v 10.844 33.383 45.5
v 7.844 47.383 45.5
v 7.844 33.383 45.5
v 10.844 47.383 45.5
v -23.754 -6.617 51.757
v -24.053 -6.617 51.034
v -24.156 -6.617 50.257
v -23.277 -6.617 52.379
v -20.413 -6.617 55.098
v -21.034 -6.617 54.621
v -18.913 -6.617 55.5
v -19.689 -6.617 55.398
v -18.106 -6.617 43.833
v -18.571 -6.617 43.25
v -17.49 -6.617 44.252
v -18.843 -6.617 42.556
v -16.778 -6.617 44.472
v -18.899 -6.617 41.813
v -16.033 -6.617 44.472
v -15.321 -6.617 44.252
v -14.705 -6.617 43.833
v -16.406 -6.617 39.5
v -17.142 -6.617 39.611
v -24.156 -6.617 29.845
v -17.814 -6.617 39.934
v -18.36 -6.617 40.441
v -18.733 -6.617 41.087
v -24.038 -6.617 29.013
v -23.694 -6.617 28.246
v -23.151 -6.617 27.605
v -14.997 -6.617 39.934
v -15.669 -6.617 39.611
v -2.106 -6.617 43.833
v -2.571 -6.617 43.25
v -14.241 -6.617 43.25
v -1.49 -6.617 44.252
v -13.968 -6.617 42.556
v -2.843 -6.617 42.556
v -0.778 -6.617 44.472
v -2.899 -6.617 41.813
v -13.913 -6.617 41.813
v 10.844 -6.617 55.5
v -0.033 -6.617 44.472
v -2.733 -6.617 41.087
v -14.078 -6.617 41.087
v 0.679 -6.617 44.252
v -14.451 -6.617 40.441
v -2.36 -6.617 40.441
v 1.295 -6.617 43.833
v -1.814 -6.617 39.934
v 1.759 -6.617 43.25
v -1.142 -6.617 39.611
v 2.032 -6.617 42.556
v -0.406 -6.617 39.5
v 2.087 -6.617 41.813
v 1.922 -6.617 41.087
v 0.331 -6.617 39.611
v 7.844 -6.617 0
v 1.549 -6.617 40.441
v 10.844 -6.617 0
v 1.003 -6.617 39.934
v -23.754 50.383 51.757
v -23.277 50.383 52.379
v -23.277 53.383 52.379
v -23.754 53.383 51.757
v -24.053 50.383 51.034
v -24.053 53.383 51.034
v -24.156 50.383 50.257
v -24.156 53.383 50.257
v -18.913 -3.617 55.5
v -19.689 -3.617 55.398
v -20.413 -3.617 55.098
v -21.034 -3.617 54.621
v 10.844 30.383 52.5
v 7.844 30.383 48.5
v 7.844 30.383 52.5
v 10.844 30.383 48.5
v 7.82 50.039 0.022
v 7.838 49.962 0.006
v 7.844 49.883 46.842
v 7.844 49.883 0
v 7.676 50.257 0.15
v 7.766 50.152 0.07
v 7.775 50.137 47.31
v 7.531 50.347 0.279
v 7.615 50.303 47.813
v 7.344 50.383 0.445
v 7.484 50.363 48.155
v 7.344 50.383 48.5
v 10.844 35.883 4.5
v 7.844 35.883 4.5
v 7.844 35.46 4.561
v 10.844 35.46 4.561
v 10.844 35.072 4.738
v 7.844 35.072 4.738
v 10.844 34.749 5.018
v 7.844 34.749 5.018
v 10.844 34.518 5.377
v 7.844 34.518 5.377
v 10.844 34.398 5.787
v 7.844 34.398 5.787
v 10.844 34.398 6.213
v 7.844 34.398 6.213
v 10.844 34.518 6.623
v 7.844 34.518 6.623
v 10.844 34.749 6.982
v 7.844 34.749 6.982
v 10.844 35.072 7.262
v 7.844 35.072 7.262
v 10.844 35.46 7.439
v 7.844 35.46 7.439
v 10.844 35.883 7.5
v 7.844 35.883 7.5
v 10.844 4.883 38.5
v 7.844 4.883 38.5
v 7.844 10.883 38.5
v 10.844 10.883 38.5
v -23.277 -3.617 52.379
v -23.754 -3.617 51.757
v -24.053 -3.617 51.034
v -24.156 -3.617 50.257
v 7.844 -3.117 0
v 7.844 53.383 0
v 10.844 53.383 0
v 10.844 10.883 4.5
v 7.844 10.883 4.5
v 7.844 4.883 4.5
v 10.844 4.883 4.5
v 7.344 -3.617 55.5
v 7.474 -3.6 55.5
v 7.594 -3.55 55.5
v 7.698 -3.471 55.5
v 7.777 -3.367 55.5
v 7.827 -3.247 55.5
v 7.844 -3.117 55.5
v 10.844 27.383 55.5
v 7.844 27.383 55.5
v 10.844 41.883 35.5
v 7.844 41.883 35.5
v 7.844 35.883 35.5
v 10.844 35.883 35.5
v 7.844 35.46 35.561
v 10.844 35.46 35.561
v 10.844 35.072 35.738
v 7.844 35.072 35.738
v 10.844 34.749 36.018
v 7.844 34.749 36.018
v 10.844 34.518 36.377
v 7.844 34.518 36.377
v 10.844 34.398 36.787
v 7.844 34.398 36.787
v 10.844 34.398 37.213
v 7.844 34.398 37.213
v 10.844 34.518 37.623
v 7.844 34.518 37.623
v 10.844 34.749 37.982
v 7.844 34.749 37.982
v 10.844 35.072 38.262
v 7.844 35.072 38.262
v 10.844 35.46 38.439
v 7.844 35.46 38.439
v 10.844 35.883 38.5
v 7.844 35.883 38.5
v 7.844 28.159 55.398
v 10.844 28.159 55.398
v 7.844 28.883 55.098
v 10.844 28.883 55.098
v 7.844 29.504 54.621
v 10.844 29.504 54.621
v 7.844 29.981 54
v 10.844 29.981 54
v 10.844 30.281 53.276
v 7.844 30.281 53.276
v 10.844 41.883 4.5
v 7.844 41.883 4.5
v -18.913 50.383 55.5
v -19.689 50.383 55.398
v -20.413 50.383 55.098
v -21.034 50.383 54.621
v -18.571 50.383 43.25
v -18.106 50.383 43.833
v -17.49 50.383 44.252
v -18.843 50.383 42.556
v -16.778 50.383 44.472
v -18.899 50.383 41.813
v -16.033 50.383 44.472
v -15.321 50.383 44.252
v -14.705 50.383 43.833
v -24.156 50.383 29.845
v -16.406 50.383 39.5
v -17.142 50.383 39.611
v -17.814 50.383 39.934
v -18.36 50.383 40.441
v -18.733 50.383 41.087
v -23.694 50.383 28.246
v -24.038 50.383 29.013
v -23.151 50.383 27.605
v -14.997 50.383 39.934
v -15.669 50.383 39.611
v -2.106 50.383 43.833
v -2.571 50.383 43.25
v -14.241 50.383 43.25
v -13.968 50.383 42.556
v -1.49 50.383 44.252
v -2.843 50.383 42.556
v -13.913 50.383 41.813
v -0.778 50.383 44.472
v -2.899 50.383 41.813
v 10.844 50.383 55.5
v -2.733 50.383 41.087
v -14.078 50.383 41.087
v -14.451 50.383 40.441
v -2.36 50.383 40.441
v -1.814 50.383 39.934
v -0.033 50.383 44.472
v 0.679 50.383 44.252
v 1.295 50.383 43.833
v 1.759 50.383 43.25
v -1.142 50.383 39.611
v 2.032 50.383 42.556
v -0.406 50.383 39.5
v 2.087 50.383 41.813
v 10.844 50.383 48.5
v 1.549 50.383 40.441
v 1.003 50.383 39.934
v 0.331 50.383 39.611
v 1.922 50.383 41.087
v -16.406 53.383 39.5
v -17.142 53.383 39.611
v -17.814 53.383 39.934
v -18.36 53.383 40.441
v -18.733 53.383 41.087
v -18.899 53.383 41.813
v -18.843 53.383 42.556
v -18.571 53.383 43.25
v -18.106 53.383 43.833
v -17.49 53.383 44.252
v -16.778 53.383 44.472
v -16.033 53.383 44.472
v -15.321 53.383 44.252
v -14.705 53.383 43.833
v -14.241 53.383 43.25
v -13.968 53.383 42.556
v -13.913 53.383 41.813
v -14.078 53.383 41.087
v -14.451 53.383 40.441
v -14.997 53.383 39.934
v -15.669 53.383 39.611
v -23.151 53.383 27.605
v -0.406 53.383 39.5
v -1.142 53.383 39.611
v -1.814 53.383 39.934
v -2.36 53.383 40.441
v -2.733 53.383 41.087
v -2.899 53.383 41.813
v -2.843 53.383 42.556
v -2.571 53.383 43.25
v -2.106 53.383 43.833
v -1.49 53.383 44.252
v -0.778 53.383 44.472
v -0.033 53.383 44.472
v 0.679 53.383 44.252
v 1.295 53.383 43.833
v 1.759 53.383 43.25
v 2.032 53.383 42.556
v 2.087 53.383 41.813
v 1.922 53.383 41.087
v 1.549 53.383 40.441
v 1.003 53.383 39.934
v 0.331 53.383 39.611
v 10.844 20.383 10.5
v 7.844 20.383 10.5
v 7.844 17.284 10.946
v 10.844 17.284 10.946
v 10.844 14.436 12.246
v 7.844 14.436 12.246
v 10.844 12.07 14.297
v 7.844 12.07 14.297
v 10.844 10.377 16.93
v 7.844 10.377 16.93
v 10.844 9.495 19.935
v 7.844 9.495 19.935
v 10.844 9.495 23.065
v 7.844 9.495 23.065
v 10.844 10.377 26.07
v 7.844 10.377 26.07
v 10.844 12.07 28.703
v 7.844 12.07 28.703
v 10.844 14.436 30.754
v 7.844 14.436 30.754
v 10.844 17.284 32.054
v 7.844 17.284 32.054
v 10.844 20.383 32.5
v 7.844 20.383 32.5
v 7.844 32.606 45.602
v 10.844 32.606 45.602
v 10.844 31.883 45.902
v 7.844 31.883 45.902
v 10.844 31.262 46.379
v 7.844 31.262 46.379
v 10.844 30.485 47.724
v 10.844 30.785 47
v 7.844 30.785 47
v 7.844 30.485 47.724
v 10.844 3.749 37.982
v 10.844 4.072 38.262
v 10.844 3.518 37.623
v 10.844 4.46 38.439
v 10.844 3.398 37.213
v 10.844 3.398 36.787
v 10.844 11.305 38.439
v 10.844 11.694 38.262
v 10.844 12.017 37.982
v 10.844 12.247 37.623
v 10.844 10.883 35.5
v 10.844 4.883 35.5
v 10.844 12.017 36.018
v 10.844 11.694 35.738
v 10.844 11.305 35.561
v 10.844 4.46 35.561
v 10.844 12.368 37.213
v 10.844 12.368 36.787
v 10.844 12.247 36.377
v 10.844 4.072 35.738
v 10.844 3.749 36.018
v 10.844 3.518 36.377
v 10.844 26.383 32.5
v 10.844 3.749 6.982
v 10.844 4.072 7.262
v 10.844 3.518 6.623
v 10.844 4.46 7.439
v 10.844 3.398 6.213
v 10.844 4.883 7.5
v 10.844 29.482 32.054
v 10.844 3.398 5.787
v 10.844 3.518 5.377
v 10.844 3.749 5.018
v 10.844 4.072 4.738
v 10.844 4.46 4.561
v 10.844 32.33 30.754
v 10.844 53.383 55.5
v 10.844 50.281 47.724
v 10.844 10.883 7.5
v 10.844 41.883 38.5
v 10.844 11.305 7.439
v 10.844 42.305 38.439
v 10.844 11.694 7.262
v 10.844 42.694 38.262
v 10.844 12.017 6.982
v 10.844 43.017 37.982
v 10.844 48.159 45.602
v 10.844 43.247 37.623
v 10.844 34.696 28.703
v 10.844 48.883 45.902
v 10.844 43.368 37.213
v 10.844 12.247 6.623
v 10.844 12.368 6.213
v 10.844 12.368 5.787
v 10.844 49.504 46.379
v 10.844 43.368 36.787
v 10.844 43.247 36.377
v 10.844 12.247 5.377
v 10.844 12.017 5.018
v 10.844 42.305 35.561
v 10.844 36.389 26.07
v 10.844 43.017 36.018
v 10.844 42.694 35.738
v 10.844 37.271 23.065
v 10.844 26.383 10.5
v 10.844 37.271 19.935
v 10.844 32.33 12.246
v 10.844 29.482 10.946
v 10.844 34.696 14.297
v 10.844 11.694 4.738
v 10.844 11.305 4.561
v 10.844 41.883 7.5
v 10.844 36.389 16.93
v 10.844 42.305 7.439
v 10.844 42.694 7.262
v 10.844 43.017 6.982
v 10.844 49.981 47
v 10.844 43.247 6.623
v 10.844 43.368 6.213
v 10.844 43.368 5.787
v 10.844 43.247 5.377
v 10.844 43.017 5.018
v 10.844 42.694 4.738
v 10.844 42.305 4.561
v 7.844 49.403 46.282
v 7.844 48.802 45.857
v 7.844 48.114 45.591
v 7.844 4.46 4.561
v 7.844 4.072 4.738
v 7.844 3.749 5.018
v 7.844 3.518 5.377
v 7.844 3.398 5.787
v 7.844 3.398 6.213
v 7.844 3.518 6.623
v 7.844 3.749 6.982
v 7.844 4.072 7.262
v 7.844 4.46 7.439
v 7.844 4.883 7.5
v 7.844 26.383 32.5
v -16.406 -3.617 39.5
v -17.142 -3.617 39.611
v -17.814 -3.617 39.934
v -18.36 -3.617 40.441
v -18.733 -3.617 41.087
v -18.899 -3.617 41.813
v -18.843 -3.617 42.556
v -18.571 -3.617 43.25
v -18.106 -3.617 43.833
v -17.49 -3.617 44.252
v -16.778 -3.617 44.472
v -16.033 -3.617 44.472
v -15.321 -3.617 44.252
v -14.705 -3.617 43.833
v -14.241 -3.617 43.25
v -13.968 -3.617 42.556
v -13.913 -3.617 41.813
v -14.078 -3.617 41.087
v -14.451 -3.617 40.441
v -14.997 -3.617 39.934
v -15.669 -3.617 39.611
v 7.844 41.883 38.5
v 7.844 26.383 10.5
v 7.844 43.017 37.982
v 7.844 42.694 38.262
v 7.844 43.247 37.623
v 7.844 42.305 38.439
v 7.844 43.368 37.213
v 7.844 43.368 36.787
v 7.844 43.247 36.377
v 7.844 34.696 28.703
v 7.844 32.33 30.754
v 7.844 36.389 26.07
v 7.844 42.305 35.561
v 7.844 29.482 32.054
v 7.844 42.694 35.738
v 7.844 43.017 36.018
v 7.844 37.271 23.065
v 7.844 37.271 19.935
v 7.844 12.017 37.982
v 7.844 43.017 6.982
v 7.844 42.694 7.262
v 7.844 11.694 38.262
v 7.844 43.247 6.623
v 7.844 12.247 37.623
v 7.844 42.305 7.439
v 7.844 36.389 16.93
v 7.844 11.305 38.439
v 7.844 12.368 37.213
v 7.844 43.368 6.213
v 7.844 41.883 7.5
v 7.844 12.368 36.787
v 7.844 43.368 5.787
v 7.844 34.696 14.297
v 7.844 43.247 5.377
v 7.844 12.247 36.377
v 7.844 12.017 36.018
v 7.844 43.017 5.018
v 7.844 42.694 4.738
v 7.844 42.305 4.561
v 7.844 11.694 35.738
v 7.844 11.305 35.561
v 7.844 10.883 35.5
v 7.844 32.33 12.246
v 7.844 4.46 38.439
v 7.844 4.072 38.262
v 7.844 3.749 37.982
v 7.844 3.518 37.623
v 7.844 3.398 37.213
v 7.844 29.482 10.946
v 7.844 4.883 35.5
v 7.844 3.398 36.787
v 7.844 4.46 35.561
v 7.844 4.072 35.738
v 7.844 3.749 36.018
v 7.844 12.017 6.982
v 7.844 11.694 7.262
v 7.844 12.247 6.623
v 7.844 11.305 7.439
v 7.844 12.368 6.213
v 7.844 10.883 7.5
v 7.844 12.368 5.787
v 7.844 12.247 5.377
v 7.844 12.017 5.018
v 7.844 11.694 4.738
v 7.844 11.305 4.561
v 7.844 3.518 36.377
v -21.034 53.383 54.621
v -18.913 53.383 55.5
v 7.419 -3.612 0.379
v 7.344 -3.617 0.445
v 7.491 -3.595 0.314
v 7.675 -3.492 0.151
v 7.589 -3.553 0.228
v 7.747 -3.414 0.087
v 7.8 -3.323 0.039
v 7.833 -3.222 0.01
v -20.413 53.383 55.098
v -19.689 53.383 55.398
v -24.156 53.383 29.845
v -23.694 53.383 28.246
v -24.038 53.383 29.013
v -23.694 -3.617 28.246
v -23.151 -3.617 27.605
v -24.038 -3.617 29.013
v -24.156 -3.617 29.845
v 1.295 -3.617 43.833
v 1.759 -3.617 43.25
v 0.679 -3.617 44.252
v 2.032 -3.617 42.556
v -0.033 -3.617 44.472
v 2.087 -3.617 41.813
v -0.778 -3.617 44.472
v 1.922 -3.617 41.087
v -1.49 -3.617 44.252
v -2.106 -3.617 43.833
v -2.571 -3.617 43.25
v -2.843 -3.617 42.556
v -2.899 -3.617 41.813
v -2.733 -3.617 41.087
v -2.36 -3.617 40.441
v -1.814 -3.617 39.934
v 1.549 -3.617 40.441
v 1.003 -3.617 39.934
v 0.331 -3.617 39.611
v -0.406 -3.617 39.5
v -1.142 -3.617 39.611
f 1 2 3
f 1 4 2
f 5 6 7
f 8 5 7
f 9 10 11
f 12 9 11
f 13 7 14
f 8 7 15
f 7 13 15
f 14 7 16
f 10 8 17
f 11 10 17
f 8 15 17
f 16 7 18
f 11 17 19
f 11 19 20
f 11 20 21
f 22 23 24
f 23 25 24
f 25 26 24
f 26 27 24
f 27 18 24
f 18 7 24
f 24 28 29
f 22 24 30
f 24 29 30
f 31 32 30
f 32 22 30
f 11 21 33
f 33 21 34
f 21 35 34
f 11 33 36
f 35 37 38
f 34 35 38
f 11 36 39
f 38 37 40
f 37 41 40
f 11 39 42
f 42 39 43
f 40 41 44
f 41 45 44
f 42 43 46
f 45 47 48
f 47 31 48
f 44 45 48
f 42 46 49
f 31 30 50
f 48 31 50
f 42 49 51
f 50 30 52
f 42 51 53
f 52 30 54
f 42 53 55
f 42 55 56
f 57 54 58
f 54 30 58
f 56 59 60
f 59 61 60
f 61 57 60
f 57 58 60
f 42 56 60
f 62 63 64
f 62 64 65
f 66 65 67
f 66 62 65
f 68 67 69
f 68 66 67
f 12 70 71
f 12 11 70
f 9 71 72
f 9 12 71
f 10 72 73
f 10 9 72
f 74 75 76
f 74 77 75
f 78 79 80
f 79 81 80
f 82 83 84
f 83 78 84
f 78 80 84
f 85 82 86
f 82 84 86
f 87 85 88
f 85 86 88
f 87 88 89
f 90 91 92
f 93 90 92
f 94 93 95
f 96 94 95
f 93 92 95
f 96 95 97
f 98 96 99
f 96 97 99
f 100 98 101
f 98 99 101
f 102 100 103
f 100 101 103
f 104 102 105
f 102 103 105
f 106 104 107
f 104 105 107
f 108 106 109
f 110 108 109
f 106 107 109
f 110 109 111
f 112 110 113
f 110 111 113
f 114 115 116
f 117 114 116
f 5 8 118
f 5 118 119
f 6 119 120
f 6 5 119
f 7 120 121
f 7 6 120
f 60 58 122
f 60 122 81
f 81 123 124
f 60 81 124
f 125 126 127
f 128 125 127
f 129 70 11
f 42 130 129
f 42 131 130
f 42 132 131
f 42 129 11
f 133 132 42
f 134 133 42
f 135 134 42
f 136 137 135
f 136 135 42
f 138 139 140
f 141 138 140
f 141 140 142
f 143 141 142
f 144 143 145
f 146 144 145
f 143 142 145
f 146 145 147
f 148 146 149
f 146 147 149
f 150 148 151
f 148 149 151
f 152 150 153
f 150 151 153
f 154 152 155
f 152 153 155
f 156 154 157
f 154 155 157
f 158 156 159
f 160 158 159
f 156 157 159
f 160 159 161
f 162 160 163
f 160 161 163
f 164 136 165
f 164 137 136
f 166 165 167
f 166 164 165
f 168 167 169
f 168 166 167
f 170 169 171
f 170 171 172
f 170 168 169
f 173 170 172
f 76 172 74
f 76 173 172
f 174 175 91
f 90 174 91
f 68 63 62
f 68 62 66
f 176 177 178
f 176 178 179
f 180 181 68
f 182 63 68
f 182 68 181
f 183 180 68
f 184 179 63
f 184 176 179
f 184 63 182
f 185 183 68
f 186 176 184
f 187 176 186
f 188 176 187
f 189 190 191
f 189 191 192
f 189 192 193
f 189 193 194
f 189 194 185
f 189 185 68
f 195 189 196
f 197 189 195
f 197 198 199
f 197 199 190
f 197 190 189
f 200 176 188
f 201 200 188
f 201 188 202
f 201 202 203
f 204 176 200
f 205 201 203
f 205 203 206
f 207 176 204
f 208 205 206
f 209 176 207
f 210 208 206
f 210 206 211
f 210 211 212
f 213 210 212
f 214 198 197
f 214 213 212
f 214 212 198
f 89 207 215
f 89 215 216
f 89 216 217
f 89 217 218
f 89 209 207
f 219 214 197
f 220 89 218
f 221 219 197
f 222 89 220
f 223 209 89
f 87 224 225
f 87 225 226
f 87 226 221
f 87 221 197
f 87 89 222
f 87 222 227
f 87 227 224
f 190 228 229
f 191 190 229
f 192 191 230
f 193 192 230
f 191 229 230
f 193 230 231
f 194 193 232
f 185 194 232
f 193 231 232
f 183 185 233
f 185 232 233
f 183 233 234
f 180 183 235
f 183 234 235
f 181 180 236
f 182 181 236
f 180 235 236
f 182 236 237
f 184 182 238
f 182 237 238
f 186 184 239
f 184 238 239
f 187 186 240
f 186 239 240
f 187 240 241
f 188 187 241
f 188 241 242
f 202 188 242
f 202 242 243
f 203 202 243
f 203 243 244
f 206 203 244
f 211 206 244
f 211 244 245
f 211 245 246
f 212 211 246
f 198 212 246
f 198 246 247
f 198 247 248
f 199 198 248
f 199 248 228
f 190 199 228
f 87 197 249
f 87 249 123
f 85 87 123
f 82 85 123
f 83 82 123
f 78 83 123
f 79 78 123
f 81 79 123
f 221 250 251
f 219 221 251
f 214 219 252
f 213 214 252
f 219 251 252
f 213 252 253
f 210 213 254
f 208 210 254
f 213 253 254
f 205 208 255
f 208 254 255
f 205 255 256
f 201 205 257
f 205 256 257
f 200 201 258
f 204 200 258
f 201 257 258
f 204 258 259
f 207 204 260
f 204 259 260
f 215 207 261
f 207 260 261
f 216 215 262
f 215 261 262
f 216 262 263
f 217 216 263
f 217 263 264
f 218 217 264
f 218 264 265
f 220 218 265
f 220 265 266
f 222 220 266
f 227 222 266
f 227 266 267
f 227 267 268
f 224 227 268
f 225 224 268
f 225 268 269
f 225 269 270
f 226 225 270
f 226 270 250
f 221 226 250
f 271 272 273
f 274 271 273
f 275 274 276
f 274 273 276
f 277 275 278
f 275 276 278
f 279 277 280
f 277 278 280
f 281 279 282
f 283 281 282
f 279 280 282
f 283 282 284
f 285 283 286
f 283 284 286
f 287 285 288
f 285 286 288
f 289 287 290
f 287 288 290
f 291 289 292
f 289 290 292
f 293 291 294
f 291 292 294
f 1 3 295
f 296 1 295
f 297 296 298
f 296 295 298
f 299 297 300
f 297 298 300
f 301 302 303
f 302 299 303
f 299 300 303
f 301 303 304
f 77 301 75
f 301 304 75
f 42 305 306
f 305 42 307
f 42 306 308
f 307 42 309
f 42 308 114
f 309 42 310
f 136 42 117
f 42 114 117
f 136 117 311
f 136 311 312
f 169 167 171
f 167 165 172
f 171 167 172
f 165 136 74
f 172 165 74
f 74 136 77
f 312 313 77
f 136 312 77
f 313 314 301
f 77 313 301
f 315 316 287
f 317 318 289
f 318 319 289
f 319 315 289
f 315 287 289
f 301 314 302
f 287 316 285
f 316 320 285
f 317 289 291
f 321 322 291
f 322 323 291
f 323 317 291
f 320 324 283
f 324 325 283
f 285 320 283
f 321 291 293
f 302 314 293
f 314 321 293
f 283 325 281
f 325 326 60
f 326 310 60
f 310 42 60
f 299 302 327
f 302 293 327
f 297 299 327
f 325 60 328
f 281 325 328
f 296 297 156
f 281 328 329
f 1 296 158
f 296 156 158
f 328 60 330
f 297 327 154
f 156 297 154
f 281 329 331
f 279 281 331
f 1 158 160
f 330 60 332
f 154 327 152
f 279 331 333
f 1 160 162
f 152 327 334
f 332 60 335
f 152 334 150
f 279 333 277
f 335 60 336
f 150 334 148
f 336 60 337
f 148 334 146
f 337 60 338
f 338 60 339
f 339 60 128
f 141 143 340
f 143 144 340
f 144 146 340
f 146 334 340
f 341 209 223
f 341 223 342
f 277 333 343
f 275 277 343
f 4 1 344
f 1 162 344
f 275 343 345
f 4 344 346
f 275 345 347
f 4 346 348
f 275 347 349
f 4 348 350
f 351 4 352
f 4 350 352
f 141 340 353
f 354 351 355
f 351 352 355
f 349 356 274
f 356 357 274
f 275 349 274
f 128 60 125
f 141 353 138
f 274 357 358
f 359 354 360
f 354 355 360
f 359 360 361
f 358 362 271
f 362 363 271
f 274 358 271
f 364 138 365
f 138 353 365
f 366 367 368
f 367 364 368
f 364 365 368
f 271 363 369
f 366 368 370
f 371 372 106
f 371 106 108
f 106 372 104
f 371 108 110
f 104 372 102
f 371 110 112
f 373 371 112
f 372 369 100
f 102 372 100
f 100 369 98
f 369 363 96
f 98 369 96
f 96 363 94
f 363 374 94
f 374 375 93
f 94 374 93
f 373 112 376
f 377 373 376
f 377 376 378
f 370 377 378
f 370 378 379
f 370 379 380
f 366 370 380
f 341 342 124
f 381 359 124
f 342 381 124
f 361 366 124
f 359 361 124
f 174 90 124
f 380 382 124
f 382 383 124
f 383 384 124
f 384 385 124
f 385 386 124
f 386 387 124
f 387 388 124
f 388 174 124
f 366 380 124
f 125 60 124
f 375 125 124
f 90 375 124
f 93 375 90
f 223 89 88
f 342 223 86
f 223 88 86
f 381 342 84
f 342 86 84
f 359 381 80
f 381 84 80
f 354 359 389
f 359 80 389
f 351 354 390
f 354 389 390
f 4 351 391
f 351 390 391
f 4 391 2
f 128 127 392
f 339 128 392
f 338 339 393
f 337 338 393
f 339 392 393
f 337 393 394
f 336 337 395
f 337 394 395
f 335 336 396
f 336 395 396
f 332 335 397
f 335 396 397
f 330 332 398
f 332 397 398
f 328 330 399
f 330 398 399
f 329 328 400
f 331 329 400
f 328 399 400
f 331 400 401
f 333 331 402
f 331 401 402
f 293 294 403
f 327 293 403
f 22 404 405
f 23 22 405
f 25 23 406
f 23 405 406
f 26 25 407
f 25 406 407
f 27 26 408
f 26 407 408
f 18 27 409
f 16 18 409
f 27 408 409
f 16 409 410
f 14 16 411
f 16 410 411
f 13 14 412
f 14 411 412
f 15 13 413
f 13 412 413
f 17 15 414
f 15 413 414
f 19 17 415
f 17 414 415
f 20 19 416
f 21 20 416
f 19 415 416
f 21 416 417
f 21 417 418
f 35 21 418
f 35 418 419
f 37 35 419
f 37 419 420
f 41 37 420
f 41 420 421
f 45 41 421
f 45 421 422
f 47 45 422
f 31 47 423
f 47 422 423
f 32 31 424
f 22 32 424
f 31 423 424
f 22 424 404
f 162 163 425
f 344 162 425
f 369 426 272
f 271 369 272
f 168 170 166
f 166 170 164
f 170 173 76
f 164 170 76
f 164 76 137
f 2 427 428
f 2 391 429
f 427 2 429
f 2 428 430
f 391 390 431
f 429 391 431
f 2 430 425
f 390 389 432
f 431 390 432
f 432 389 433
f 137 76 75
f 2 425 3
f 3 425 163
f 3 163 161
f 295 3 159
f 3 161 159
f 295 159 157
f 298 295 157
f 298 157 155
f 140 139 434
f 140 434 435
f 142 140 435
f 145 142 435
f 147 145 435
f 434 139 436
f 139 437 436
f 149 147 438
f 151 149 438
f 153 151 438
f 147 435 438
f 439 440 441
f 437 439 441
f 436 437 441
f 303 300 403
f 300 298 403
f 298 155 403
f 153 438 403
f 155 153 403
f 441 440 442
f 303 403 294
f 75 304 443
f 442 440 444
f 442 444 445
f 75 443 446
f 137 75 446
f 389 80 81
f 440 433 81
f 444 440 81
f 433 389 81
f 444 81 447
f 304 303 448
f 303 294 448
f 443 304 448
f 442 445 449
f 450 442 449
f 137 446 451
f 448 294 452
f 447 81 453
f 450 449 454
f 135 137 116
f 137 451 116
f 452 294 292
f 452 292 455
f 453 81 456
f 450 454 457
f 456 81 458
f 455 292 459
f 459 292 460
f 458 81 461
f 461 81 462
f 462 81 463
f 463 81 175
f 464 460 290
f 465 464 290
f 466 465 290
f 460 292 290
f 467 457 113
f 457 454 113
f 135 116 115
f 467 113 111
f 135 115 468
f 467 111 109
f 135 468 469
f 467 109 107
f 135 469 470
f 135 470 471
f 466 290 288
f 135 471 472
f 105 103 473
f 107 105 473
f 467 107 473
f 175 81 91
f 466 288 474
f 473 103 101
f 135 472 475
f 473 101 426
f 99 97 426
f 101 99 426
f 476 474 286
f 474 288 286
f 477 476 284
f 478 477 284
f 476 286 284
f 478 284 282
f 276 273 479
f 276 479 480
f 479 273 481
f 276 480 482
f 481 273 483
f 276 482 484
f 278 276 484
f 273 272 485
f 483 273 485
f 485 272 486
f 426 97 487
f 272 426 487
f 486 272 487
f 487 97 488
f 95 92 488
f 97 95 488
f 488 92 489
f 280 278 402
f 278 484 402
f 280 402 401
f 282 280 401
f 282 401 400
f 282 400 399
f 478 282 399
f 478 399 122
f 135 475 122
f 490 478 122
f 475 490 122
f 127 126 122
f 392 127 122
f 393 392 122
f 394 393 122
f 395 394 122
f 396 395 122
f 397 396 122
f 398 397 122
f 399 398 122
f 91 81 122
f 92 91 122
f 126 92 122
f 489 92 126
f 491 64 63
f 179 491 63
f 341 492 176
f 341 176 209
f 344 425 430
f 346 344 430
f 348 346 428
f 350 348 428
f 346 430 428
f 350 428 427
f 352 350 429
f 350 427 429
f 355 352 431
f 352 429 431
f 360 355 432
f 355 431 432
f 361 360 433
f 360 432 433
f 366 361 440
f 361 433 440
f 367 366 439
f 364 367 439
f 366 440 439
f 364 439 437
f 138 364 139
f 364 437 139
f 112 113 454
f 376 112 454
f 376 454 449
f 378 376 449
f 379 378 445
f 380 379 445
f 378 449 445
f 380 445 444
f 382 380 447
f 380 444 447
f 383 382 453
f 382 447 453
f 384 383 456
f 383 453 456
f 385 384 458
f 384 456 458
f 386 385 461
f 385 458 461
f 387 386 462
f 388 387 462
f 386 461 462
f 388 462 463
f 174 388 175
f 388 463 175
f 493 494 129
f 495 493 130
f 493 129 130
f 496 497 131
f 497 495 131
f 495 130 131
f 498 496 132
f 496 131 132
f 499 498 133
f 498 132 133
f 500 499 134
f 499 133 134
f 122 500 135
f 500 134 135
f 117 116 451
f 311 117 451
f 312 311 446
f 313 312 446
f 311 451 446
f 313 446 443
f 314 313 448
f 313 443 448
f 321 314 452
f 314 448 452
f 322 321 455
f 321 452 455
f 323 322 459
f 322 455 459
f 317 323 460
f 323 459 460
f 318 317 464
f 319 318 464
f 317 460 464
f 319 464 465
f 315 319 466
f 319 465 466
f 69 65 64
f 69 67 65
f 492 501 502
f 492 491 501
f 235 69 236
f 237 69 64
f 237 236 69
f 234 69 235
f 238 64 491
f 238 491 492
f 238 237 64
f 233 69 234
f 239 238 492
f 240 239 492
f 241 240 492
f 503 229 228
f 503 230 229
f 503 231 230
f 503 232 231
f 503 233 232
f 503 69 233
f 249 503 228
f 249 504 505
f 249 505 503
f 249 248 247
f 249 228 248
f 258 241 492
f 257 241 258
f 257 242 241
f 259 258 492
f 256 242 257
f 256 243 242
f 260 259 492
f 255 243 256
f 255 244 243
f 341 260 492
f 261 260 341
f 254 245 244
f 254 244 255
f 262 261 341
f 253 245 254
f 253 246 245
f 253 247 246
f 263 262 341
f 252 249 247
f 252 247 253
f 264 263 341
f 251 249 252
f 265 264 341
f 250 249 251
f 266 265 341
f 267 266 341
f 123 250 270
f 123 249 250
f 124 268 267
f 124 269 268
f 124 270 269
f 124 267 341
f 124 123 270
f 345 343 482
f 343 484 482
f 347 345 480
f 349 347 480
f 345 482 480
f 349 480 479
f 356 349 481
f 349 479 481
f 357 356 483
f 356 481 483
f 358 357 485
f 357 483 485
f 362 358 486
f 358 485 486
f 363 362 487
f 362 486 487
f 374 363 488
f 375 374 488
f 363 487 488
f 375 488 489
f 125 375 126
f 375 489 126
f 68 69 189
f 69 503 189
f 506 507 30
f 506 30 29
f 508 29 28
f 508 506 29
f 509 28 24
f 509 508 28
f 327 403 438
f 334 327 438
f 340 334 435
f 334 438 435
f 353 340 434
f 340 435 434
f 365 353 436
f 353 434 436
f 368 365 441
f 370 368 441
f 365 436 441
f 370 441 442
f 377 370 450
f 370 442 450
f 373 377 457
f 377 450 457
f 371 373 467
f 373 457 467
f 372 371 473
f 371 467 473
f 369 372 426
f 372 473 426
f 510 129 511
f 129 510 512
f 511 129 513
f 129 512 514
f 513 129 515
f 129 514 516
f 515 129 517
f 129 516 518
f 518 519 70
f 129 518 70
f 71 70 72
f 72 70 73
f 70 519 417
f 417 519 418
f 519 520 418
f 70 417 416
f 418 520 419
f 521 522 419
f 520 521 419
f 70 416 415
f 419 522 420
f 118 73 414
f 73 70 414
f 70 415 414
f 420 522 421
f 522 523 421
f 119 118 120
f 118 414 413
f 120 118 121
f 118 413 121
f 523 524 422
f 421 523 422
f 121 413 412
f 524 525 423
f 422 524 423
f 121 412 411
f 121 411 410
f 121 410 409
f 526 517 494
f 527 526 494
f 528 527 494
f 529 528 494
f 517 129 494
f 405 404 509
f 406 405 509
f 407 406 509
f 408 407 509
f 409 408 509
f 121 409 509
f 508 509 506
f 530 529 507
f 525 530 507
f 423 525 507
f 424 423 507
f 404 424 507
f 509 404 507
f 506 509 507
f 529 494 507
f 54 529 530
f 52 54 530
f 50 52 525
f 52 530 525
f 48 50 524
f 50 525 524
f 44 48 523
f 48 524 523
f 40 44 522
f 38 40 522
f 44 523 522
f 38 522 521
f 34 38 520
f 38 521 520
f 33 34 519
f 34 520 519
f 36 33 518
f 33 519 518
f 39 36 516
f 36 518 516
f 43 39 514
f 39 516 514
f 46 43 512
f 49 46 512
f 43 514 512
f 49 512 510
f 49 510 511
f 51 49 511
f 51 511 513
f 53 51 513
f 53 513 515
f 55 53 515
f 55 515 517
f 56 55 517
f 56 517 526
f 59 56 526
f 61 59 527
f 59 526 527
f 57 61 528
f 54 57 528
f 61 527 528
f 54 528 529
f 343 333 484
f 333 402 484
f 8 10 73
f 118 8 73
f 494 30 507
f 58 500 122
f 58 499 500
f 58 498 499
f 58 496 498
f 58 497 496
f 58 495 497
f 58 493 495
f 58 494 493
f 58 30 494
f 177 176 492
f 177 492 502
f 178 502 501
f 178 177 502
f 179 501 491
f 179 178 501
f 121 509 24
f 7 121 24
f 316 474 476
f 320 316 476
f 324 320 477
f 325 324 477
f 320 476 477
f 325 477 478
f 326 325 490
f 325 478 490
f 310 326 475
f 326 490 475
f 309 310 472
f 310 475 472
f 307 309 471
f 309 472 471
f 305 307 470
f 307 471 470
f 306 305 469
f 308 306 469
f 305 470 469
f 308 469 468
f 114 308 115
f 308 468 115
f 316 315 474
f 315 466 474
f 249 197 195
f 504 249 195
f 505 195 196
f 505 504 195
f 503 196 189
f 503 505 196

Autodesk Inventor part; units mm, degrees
ref_plane "YZ Plane" through (0, 0, 0) normal (1, 0, 0) x (0, 1, 0)
ref_plane "XZ Plane" through (0, 0, 0) normal (0, 1, 0) x (-1, 0, 0)
ref_plane "XY Plane" through (0, 0, 0) normal (0, 0, 1) x (1, 0, 0)
sketch "Szkic1" plane through (0, 0, 0) normal (0, 0, 1) x (1, 0, 0)
  line L0 (-24.1556, -3.6171) -> (-24.1556, -6.6171)
  line L1 (-24.1556, -6.6171) -> (10.8444, -6.6171)
  line L2 (10.8444, -6.6171) -> (10.8444, 53.3829)
  line L3 (7.8444, 50.3829) -> (7.8444, -3.6171)
  line L4 (7.8444, -3.6171) -> (-24.1556, -3.6171)
  line L5 (-24.1556, 53.3829) -> (-24.1556, 50.3829)
  line L6 (-24.1556, 50.3829) -> (7.8444, 50.3829)
  line L7 (-24.1556, 53.3829) -> (10.8444, 53.3829)
  point P0 (0, 0)
  dimension "d2" = 60
  dimension "d87" = 3
  dimension "d89" = 3
  dimension "d90" = 3
  dimension "d123" = 35
  dimension "d124" = 35
extrude "Wyciągnięcie proste1" add sketch "Szkic1" along normal blind 55.5
fillet "Zaokrąglenie1" radius 0.5 2 edges at (7.8444, -3.6171, 27.75) (7.8444, 50.3829, 27.75)
sketch "Szkic9" plane through (7.8444, -3.1171, 0) normal (-1, 0, 0) x (0, 0, 1)
  line L0 (42.5, 5.5) -> (0.5, 5.5)
  line L1 (0.5, 5.5) -> (0.5, 47.5)
  line L2 (0.5, 47.5) -> (42.5, 47.5)
  line L3 (42.5, 47.5) -> (42.5, 5.5)
  line L4 (0, 53) -> (55.5, 53) projected
  line L5 (0, 53) -> (0, 0) projected
  line L6 (55.5, 0) -> (0, 0) projected
  line L7 (55.5, 53) -> (55.5, 0) projected
  line L8 (37, 14) -> (37, 8) construction
  line L9 (35.5, 14) -> (35.5, 8)
  line L10 (38.5, 8) -> (38.5, 14)
  arc A0 (38.5, 14) -> (35.5, 14) centre (37, 14) ccw
  arc A1 (35.5, 8) -> (38.5, 8) centre (37, 8) ccw
  line L11 (37, 45) -> (37, 39) construction
  line L12 (35.5, 45) -> (35.5, 39)
  line L13 (38.5, 39) -> (38.5, 45)
  arc A2 (38.5, 45) -> (35.5, 45) centre (37, 45) ccw
  arc A3 (35.5, 39) -> (38.5, 39) centre (37, 39) ccw
  line L14 (6, 14) -> (6, 8) construction
  line L15 (4.5, 14) -> (4.5, 8)
  line L16 (7.5, 8) -> (7.5, 14)
  arc A4 (7.5, 14) -> (4.5, 14) centre (6, 14) ccw
  arc A5 (4.5, 8) -> (7.5, 8) centre (6, 8) ccw
  line L17 (6, 45) -> (6, 39) construction
  line L18 (4.5, 45) -> (4.5, 39)
  line L19 (7.5, 39) -> (7.5, 45)
  arc A6 (7.5, 45) -> (4.5, 45) centre (6, 45) ccw
  arc A7 (4.5, 39) -> (7.5, 39) centre (6, 39) ccw
  line L20 (21.5, 29.5) -> (21.5, 23.5) construction
  line L21 (10.5, 29.5) -> (10.5, 23.5)
  line L22 (32.5, 23.5) -> (32.5, 29.5)
  arc A8 (32.5, 29.5) -> (10.5, 29.5) centre (21.5, 29.5) ccw
  arc A9 (10.5, 23.5) -> (32.5, 23.5) centre (21.5, 23.5) ccw
  point P0 (0, 3.1171)
  point P1 (37, 11)
  point P2 (6, 11)
  point P3 (37, 42)
  point P4 (6, 42)
  point P5 (21.5, 26.5)
  dimension "d128" = 42
  dimension "d129" = 42
  dimension "d130" = 5.5
  dimension "d131" = 0.5
  dimension "d132" = 53
  dimension "d133" = 5.5
  dimension "d134" = 5.5
  dimension "d135" = 5.5
  dimension "d136" = 5.5
  dimension "d137" = 5.5
  dimension "d138" = 5.5
  dimension "d139" = 5.5
  dimension "d140" = 5.5
  dimension "d141" = 21
  dimension "d142" = 21
  dimension "d143" = 3
  dimension "d144" = 3
  dimension "d145" = 3
  dimension "d146" = 3
  dimension "d147" = 3
  dimension "d148" = 3
  dimension "d149" = 3
  dimension "d150" = 3
  dimension "d151" = 3
  dimension "d152" = 22
extrude "Wyciągnięcie proste4" cut sketch "Szkic9" against normal blind 3 contours A0 L10 A1 L9 | A2 L13 A3 L12 | A4 L16 A5 L15 | A6 L19 A7 L18 | A8 L22 A9 L21
sketch "Szkic10" plane through (-24.1556, -6.6171, 0) normal (0, -1, 0) x (1, 0, 0)
  line L0 (0, 0) -> (35, 0) projected
  line L1 (35, 0) -> (35, 55.5) projected
  line L2 (0, 55.5) -> (35, 55.5) projected
  line L3 (0, 0) -> (0, 55.5) projected
  line L4 (32, 55.5) -> (32, 0) projected
  line L5 (0, 28.5) -> (32, 28.5)
  line L6 (32, 10.5) -> (32, 32.5) projected
  line L7 (0, 28.5) -> (32, 0)
  point P0 (24.1556, 0)
  dimension "d155" = 28.5
extrude "Wyciągnięcie proste5" cut sketch "Szkic10" against normal up to surface (60 mm away) contours L3 L7 L0
sketch "Szkic11" plane through (-24.1556, -6.6171, 55.5) normal (0, -1, 0) x (1, 0, 0)
  line L0 (0, -27) -> (32, -55.5) projected
  line L1 (32, -55.5) -> (35, -55.5) projected
  line L2 (35, -55.5) -> (35, 0) projected
  line L3 (0, 0) -> (35, 0) projected
  line L4 (0, -27) -> (0, 0) projected
  line L5 (31.5, -55.0547) -> (31.5, 0) projected
  line L6 (32, 0) -> (32, -55.5) projected
  point P0 (24.1556, -55.5)
  point P1 (7.75, -13.5)
  point P2 (23.75, -13.5)
  dimension "d158" = 13.5
  dimension "d159" = 13.5
  dimension "d160" = 16
  dimension "d161" = 31.5
  dimension "d162" = 7.75
hole "Otwór7" at (-16.4056, -6.6171, 42) at (-0.4056, -6.6171, 42) direction (0, 1, 0) diameter 5 end through all
chamfer "Faza5" distance 4 angle 45 2 edges at (-24.1556, -5.1171, 55.5) (-24.1556, 51.8829, 55.5)
fillet "Zaokrąglenie6" radius 3 6 edges at (-24.1556, -5.1171, 28.5) (-24.1556, 51.8829, 28.5) (-24.1556, 51.8829, 51.5) (-20.1556, 51.8829, 55.5) (-24.1556, -5.1171, 51.5) (-20.1556, -5.1171, 55.5)
sketch "Szkic12" plane through (10.8444, -6.6171, 0) normal (1, 0, 0) x (0, 0, -1)
  line L0 (-55.5, 57) -> (-0.4453, 57) projected
  arc A0 (-7.5, 42.5) -> (-4.5, 42.5) centre (-6, 42.5) ccw projected
  line L1 (-7.5, 42.5) -> (-7.5, 48.5) projected
  arc A1 (-4.5, 48.5) -> (-7.5, 48.5) centre (-6, 48.5) ccw projected
  line L2 (-4.5, 48.5) -> (-4.5, 42.5) projected
  arc A2 (-38.5, 42.5) -> (-35.5, 42.5) centre (-37, 42.5) ccw projected
  line L3 (-38.5, 42.5) -> (-38.5, 48.5) projected
  arc A3 (-35.5, 48.5) -> (-38.5, 48.5) centre (-37, 48.5) ccw projected
  line L4 (-35.5, 48.5) -> (-35.5, 42.5) projected
  arc A4 (-38.5, 11.5) -> (-35.5, 11.5) centre (-37, 11.5) ccw projected
  line L5 (-38.5, 11.5) -> (-38.5, 17.5) projected
  arc A5 (-35.5, 17.5) -> (-38.5, 17.5) centre (-37, 17.5) ccw projected
  line L6 (-35.5, 17.5) -> (-35.5, 11.5) projected
  arc A6 (-7.5, 11.5) -> (-4.5, 11.5) centre (-6, 11.5) ccw projected
  line L7 (-7.5, 11.5) -> (-7.5, 17.5) projected
  arc A7 (-4.5, 17.5) -> (-7.5, 17.5) centre (-6, 17.5) ccw projected
  line L8 (-4.5, 17.5) -> (-4.5, 11.5) projected
  arc A8 (-32.5, 27) -> (-10.5, 27) centre (-21.5, 27) ccw projected
  line L9 (-32.5, 27) -> (-32.5, 33) projected
  arc A9 (-10.5, 33) -> (-32.5, 33) centre (-21.5, 33) ccw projected
  line L10 (-10.5, 33) -> (-10.5, 27) projected
  line L11 (0, 0) -> (0, 60) projected
  line L12 (0, 60) -> (-55.5, 60) projected
  line L13 (-55.5, 0) -> (-55.5, 60) projected
  line L14 (0, 0) -> (-55.5, 0) projected
  line L15 (-0.4453, 3) -> (-55.5, 3) projected
  line L16 (-55.5, 57) -> (-45.5, 57)
  line L17 (-45.5, 57) -> (-45.5, 37)
  line L18 (-45.5, 37) -> (-55.5, 37)
  line L19 (-55.5, 37) -> (-55.5, 57)
  point P0 (0, 6.6171)
  dimension "d174" = 20
  dimension "d175" = 10
extrude "Wyciągnięcie proste6" cut sketch "Szkic12" against normal through all contours L0 L17 L18 L13
fillet "Zaokrąglenie7" radius 3 3 edges at (9.0944, 50.3829, 45.5) (9.3444, 30.3829, 45.5) (9.3444, 30.3829, 55.5)
equation "\"d124\" = d123"
equation "\"d130\" = -0.5 * d129 + 0.5 * d132"
equation "\"d134\" = d133"
equation "\"d135\" = d133"
equation "\"d136\" = d133"
equation "\"d137\" = d133"
equation "\"d138\" = d133"
equation "\"d139\" = d133"
equation "\"d140\" = d133"
equation "\"d141\" = 0.5 * d129"
equation "\"d142\" = d141"
equation "\"d159\" = d158"
equation "\"d162\" = -0.5 * d160 + 0.5 * d161"
properties part number "CNCM_ALU_Y_Axis_Nema_17_Mount"
